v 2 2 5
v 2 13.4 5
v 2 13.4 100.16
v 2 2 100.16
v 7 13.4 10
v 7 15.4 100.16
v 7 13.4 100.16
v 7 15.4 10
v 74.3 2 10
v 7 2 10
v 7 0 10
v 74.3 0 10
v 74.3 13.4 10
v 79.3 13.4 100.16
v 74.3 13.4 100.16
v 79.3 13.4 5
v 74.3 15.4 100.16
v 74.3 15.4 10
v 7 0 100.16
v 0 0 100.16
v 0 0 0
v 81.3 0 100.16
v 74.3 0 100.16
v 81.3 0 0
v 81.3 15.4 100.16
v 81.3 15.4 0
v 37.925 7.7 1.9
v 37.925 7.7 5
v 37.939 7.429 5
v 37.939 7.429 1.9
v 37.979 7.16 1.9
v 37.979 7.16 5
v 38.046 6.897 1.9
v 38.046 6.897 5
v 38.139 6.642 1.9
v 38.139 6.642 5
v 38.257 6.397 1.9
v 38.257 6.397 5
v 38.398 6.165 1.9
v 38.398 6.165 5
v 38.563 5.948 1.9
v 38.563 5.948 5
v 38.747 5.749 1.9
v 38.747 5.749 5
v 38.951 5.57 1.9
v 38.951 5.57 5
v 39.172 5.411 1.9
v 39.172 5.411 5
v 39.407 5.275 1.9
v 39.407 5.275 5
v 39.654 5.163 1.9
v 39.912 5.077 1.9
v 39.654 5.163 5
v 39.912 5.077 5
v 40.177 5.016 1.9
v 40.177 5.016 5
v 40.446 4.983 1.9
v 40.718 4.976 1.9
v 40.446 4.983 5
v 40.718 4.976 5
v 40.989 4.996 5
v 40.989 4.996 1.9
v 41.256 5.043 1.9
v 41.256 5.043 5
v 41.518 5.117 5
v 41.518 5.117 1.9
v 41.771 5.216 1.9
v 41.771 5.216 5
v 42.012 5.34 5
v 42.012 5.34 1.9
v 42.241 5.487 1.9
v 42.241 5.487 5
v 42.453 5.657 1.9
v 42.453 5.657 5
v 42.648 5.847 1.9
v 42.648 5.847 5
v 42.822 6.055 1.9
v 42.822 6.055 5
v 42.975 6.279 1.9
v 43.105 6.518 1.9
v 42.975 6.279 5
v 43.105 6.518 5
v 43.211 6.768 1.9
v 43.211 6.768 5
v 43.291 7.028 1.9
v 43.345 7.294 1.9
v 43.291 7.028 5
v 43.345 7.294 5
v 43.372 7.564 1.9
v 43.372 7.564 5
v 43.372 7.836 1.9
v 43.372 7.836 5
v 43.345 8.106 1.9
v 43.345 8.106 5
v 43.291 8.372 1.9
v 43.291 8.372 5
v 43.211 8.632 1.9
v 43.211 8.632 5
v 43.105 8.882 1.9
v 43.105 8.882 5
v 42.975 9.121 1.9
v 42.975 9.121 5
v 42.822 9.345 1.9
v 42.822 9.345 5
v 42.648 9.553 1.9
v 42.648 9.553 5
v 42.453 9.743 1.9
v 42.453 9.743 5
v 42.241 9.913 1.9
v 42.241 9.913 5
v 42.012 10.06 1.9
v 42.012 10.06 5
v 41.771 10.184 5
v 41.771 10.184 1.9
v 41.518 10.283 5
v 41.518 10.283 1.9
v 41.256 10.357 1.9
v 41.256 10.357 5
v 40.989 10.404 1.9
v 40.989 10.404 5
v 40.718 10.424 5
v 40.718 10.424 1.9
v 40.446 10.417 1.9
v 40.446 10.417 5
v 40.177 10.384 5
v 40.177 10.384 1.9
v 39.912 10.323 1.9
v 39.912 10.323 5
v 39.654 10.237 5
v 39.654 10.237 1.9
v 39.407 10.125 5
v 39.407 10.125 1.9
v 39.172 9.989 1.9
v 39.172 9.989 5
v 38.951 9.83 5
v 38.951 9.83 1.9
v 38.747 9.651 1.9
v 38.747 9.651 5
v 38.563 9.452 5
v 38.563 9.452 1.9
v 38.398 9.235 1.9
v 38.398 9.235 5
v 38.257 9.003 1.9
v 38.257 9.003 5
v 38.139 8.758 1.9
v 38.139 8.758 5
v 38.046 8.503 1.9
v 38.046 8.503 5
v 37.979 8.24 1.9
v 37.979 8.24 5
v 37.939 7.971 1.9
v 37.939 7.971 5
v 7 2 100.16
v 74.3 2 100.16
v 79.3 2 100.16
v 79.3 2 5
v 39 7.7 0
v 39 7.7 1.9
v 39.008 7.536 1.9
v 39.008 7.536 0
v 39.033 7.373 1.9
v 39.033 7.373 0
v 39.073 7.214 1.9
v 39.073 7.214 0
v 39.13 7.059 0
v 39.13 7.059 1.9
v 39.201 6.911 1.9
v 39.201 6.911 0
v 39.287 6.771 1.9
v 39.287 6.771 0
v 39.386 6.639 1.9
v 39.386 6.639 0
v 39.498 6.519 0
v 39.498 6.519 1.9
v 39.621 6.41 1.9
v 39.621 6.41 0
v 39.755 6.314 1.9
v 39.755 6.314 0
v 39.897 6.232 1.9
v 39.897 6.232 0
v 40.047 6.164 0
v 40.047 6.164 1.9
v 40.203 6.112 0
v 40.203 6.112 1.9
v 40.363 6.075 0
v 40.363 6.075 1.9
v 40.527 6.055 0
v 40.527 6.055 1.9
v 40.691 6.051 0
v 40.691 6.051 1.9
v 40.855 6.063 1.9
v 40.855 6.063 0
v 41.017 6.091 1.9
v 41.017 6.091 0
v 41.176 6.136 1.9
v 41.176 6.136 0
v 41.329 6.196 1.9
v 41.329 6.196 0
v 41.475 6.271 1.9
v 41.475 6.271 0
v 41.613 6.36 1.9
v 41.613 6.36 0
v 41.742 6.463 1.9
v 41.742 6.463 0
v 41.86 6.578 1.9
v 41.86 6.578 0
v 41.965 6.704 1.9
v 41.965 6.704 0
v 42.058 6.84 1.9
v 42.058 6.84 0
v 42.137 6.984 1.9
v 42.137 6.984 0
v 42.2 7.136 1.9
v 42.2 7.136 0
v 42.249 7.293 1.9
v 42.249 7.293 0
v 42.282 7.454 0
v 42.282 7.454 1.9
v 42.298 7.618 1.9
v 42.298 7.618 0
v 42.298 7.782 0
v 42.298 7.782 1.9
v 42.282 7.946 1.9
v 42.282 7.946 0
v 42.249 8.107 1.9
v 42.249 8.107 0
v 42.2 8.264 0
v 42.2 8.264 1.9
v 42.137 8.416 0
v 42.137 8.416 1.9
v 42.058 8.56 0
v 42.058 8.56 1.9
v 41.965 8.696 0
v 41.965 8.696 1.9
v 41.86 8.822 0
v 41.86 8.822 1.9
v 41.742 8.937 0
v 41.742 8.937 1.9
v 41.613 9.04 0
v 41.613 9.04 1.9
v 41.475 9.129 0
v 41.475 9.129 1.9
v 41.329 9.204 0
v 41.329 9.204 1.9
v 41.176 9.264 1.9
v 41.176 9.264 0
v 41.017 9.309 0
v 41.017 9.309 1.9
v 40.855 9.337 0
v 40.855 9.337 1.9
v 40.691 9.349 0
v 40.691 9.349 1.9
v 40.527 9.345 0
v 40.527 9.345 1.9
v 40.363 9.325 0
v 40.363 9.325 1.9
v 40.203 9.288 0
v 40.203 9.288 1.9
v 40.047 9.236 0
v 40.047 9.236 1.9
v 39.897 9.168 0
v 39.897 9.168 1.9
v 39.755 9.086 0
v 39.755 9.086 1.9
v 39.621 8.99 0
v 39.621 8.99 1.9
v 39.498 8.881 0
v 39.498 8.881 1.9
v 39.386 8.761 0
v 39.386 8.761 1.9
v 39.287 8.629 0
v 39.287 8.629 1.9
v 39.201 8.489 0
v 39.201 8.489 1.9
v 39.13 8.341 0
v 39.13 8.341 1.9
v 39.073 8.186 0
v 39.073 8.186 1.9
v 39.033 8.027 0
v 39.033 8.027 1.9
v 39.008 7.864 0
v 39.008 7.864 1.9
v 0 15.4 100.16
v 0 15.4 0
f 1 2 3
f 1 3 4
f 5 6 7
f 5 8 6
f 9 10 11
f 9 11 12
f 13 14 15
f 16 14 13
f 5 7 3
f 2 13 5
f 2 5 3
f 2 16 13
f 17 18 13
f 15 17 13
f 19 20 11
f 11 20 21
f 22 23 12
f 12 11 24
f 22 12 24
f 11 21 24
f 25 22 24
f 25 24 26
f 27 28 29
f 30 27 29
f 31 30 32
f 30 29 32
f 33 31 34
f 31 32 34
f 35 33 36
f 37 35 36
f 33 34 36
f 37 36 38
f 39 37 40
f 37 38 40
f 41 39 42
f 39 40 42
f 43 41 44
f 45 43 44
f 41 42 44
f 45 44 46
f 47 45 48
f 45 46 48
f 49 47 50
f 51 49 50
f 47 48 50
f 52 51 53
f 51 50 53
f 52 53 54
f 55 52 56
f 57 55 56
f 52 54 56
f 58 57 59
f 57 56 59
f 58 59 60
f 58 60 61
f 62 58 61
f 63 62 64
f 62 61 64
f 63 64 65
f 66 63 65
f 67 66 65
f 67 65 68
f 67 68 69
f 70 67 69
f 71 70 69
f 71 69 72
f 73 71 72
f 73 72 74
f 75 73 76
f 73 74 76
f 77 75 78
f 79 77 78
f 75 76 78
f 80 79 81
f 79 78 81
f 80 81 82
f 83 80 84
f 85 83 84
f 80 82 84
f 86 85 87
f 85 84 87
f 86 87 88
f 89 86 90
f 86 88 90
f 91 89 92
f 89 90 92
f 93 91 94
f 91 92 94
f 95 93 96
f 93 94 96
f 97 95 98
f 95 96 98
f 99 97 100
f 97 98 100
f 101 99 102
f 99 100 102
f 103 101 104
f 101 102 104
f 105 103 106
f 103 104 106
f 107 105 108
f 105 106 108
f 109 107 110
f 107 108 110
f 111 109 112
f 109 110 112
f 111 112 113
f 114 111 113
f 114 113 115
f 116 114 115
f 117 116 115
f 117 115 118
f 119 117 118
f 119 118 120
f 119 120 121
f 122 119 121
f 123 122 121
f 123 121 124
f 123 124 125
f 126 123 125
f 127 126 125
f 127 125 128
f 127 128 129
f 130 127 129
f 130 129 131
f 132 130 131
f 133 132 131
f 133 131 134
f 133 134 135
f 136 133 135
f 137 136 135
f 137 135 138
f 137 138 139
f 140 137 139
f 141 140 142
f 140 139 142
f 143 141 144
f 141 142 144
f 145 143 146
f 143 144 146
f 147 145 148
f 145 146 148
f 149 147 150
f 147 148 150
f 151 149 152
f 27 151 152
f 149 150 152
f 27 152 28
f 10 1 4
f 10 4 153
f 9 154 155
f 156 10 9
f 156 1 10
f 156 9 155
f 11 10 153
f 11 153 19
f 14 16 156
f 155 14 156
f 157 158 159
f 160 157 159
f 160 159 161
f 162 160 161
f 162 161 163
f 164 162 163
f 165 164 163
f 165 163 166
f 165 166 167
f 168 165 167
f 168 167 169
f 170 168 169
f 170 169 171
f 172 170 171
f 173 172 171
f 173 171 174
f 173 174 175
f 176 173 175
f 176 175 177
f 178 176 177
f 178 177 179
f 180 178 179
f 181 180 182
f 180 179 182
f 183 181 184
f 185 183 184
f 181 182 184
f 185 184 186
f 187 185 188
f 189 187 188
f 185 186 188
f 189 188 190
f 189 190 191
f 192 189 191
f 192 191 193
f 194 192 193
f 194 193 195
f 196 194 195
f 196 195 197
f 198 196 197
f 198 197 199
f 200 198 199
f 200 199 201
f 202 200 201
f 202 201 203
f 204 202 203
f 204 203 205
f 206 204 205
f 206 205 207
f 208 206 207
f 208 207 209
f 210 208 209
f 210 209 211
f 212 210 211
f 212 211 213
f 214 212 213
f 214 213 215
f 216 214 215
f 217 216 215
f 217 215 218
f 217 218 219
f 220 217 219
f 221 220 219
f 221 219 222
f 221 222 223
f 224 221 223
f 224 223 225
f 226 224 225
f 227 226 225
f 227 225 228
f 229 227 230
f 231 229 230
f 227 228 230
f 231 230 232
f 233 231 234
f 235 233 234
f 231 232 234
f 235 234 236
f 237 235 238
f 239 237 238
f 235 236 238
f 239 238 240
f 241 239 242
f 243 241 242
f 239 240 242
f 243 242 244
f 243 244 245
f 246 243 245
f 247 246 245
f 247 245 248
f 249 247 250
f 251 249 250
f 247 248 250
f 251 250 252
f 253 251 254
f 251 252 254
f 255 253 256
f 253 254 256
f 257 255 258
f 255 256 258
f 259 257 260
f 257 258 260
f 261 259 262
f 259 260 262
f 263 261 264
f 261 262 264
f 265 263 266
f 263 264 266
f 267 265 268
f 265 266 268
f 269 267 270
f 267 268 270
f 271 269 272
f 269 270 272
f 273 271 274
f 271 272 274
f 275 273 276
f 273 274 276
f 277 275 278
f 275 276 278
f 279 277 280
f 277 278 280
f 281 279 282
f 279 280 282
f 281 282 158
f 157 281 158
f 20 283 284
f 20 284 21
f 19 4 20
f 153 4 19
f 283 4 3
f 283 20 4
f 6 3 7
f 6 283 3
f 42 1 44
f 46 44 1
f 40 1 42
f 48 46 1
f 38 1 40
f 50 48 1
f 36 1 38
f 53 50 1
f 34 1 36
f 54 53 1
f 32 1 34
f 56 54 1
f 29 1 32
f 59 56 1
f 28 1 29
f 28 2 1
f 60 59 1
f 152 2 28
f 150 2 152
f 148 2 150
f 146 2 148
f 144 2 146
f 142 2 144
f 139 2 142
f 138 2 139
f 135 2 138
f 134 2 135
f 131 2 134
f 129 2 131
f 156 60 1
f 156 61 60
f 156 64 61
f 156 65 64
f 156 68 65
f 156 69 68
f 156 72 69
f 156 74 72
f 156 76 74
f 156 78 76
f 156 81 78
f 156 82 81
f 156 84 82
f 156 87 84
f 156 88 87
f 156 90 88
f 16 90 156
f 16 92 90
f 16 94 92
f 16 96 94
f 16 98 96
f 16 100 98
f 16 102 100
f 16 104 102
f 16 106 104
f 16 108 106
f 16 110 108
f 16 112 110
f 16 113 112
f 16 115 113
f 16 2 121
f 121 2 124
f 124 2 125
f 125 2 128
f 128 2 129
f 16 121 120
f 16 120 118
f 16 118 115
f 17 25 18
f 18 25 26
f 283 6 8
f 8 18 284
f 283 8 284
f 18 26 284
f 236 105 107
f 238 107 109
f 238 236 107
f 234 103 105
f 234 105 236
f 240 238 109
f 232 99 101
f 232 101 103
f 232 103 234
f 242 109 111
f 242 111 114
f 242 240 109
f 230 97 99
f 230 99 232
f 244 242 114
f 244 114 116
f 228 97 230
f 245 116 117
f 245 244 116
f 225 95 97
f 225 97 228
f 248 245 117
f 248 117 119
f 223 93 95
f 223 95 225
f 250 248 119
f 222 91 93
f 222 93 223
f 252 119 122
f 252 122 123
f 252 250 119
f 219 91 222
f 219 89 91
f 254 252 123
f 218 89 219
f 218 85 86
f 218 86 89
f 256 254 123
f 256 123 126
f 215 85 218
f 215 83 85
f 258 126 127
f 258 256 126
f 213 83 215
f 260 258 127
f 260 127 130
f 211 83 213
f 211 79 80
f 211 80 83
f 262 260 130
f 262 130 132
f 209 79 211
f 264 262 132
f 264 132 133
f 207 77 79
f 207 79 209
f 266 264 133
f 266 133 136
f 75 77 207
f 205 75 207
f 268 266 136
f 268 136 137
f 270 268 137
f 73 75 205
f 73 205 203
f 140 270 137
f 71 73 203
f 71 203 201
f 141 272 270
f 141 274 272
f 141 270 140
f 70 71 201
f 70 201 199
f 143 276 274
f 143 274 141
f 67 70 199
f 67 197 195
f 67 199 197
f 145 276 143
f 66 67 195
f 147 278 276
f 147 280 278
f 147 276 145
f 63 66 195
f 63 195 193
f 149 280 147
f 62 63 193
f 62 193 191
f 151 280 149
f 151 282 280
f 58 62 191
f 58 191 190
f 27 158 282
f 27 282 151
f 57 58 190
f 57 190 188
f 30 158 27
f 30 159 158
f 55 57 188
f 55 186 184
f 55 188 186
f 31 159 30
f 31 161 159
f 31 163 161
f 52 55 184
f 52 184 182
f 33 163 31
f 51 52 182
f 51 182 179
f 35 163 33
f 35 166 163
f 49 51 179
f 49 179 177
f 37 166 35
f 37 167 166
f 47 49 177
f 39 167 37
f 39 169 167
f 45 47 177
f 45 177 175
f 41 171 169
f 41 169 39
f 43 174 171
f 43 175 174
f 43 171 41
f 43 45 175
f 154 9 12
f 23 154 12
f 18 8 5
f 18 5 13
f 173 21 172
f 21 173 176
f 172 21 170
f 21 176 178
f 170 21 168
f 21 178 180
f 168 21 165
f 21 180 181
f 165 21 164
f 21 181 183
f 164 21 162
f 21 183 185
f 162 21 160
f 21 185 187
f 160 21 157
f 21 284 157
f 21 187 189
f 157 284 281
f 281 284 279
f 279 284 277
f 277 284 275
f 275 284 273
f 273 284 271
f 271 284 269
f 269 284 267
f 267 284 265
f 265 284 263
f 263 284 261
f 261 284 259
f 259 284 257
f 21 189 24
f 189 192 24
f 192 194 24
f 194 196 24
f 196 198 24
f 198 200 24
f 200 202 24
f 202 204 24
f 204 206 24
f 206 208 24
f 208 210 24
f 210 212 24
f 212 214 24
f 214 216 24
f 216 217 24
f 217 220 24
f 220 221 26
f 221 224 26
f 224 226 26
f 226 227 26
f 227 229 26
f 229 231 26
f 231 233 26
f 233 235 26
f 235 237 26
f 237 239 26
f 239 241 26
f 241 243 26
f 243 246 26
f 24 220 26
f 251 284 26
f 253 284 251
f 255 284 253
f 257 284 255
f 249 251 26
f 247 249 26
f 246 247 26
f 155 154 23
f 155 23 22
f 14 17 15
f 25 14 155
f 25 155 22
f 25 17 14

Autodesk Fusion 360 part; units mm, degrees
sketch "Sketch1" plane through (0, 0, 0) normal (0, 0, 1) x (1, 0, 0)
  line L0 (0, 0) -> (81.3, 0)
  line L1 (81.3, 0) -> (81.3, 15.4)
  line L2 (81.3, 15.4) -> (0, 15.4)
  line L3 (0, 15.4) -> (0, 0)
  dimension "d8" = 81.3
  dimension "d9" = 15.4
extrude "Extrude1" add sketch "Sketch1" along normal blind 5
sketch "Sketch2" plane through (0, 0, 5) normal (0, 0, 1) x (-1, 0, 0)
  line L0 (0, -15.4) -> (0, 0)
  line L1 (0, 0) -> (-81.3, 0)
  line L2 (-81.3, 0) -> (-81.3, -15.4)
  line L3 (-81.3, -15.4) -> (0, -15.4)
  circle A0 centre (-40.65, -7.7) radius 1.65
  circle A1 centre (-40.65, -7.7) radius 2.725
  dimension "d16" = 3.3
  dimension "d17" = 40.65
  dimension "d18" = 7.7
  dimension "d19" = 5.45
extrude "Extrude2" cut sketch "Sketch2" against normal blind 5 contours A0
extrude "Extrude3" cut sketch "Sketch2" against normal blind 3.1 contours A1
sketch "Sketch3" plane through (0, 0, 5) normal (0, 0, 1) x (1, 0, 0)
  line L0 (40.65, 14.9854) -> (40.65, -0.0146) construction
  line L1 (0, 15.4) -> (0, 0) construction
  line L2 (74.3, 15.4) -> (74.3, 13.4)
  line L3 (74.3, 13.4) -> (79.3, 13.4)
  line L4 (79.3, 13.4) -> (79.3, 2)
  line L5 (79.3, 2) -> (74.3, 2)
  line L6 (74.3, 2) -> (74.3, 0)
  line L7 (74.3, 0) -> (81.3, 0)
  line L8 (81.3, 0) -> (81.3, 15.4)
  line L9 (81.3, 15.4) -> (74.3, 15.4)
  line L10 (0, 0) -> (0, 15.4)
  line L11 (2, 13.4) -> (2, 2)
  line L12 (2, 2) -> (7, 2)
  line L13 (7, 13.4) -> (2, 13.4)
  line L14 (7, 0) -> (0, 0)
  line L15 (7, 15.4) -> (7, 13.4)
  line L16 (0, 15.4) -> (7, 15.4)
  line L17 (7, 2) -> (7, 0)
  line L18 (7, 15.4) -> (74.3, 15.4)
  line L19 (74.3, 15.4) -> (74.3, 13.4)
  line L20 (74.3, 13.4) -> (7, 13.4)
  line L21 (7, 13.4) -> (7, 15.4)
  line L22 (74.3, 2) -> (7, 2)
  line L23 (7, 2) -> (7, 0)
  line L24 (7, 0) -> (74.3, 0)
  line L25 (74.3, 0) -> (74.3, 2)
  point P0 (81.3, 0)
  dimension "d24" = 40.65
  dimension "d25" = 2
  dimension "d26" = 15.4
  dimension "d27" = 2
  dimension "d29" = 5
extrude "Extrude4" add sketch "Sketch3" along normal blind 95.16 contours L2 L3 L4 L5 L6 L7 L8 L9 L19 L25 | L10 L11 L12 L13 L14 L15 L16 L17 L21 L23
extrude "Extrude5" add sketch "Sketch3" along normal blind 5 contours L2 L15 L18 L19 L20 L21 | L6 L17 L22 L23 L24 L25
equation "pw = 74.8 mm"
equation "pd = 8.9 mm"
equation "ph = 158.6 mm"
equation "clearance = 1.25 mm"
equation "wall_thick = 2 mm"
equation "outer_w = 2 * clearance + 2 * wall_thick + pw"
equation "outer_d = 2 * clearance + 2 * wall_thick + pd"
equation "d8 = outer_w"
equation "d9 = outer_d"
equation "d17 = outer_w / 2"
equation "d18 = outer_d / 2"
equation "d24 = outer_w / 2"
equation "d25 = wall_thick"
equation "d26 = outer_d"
equation "d27 = wall_thick"
equation "d30 = ph * 0.6"
